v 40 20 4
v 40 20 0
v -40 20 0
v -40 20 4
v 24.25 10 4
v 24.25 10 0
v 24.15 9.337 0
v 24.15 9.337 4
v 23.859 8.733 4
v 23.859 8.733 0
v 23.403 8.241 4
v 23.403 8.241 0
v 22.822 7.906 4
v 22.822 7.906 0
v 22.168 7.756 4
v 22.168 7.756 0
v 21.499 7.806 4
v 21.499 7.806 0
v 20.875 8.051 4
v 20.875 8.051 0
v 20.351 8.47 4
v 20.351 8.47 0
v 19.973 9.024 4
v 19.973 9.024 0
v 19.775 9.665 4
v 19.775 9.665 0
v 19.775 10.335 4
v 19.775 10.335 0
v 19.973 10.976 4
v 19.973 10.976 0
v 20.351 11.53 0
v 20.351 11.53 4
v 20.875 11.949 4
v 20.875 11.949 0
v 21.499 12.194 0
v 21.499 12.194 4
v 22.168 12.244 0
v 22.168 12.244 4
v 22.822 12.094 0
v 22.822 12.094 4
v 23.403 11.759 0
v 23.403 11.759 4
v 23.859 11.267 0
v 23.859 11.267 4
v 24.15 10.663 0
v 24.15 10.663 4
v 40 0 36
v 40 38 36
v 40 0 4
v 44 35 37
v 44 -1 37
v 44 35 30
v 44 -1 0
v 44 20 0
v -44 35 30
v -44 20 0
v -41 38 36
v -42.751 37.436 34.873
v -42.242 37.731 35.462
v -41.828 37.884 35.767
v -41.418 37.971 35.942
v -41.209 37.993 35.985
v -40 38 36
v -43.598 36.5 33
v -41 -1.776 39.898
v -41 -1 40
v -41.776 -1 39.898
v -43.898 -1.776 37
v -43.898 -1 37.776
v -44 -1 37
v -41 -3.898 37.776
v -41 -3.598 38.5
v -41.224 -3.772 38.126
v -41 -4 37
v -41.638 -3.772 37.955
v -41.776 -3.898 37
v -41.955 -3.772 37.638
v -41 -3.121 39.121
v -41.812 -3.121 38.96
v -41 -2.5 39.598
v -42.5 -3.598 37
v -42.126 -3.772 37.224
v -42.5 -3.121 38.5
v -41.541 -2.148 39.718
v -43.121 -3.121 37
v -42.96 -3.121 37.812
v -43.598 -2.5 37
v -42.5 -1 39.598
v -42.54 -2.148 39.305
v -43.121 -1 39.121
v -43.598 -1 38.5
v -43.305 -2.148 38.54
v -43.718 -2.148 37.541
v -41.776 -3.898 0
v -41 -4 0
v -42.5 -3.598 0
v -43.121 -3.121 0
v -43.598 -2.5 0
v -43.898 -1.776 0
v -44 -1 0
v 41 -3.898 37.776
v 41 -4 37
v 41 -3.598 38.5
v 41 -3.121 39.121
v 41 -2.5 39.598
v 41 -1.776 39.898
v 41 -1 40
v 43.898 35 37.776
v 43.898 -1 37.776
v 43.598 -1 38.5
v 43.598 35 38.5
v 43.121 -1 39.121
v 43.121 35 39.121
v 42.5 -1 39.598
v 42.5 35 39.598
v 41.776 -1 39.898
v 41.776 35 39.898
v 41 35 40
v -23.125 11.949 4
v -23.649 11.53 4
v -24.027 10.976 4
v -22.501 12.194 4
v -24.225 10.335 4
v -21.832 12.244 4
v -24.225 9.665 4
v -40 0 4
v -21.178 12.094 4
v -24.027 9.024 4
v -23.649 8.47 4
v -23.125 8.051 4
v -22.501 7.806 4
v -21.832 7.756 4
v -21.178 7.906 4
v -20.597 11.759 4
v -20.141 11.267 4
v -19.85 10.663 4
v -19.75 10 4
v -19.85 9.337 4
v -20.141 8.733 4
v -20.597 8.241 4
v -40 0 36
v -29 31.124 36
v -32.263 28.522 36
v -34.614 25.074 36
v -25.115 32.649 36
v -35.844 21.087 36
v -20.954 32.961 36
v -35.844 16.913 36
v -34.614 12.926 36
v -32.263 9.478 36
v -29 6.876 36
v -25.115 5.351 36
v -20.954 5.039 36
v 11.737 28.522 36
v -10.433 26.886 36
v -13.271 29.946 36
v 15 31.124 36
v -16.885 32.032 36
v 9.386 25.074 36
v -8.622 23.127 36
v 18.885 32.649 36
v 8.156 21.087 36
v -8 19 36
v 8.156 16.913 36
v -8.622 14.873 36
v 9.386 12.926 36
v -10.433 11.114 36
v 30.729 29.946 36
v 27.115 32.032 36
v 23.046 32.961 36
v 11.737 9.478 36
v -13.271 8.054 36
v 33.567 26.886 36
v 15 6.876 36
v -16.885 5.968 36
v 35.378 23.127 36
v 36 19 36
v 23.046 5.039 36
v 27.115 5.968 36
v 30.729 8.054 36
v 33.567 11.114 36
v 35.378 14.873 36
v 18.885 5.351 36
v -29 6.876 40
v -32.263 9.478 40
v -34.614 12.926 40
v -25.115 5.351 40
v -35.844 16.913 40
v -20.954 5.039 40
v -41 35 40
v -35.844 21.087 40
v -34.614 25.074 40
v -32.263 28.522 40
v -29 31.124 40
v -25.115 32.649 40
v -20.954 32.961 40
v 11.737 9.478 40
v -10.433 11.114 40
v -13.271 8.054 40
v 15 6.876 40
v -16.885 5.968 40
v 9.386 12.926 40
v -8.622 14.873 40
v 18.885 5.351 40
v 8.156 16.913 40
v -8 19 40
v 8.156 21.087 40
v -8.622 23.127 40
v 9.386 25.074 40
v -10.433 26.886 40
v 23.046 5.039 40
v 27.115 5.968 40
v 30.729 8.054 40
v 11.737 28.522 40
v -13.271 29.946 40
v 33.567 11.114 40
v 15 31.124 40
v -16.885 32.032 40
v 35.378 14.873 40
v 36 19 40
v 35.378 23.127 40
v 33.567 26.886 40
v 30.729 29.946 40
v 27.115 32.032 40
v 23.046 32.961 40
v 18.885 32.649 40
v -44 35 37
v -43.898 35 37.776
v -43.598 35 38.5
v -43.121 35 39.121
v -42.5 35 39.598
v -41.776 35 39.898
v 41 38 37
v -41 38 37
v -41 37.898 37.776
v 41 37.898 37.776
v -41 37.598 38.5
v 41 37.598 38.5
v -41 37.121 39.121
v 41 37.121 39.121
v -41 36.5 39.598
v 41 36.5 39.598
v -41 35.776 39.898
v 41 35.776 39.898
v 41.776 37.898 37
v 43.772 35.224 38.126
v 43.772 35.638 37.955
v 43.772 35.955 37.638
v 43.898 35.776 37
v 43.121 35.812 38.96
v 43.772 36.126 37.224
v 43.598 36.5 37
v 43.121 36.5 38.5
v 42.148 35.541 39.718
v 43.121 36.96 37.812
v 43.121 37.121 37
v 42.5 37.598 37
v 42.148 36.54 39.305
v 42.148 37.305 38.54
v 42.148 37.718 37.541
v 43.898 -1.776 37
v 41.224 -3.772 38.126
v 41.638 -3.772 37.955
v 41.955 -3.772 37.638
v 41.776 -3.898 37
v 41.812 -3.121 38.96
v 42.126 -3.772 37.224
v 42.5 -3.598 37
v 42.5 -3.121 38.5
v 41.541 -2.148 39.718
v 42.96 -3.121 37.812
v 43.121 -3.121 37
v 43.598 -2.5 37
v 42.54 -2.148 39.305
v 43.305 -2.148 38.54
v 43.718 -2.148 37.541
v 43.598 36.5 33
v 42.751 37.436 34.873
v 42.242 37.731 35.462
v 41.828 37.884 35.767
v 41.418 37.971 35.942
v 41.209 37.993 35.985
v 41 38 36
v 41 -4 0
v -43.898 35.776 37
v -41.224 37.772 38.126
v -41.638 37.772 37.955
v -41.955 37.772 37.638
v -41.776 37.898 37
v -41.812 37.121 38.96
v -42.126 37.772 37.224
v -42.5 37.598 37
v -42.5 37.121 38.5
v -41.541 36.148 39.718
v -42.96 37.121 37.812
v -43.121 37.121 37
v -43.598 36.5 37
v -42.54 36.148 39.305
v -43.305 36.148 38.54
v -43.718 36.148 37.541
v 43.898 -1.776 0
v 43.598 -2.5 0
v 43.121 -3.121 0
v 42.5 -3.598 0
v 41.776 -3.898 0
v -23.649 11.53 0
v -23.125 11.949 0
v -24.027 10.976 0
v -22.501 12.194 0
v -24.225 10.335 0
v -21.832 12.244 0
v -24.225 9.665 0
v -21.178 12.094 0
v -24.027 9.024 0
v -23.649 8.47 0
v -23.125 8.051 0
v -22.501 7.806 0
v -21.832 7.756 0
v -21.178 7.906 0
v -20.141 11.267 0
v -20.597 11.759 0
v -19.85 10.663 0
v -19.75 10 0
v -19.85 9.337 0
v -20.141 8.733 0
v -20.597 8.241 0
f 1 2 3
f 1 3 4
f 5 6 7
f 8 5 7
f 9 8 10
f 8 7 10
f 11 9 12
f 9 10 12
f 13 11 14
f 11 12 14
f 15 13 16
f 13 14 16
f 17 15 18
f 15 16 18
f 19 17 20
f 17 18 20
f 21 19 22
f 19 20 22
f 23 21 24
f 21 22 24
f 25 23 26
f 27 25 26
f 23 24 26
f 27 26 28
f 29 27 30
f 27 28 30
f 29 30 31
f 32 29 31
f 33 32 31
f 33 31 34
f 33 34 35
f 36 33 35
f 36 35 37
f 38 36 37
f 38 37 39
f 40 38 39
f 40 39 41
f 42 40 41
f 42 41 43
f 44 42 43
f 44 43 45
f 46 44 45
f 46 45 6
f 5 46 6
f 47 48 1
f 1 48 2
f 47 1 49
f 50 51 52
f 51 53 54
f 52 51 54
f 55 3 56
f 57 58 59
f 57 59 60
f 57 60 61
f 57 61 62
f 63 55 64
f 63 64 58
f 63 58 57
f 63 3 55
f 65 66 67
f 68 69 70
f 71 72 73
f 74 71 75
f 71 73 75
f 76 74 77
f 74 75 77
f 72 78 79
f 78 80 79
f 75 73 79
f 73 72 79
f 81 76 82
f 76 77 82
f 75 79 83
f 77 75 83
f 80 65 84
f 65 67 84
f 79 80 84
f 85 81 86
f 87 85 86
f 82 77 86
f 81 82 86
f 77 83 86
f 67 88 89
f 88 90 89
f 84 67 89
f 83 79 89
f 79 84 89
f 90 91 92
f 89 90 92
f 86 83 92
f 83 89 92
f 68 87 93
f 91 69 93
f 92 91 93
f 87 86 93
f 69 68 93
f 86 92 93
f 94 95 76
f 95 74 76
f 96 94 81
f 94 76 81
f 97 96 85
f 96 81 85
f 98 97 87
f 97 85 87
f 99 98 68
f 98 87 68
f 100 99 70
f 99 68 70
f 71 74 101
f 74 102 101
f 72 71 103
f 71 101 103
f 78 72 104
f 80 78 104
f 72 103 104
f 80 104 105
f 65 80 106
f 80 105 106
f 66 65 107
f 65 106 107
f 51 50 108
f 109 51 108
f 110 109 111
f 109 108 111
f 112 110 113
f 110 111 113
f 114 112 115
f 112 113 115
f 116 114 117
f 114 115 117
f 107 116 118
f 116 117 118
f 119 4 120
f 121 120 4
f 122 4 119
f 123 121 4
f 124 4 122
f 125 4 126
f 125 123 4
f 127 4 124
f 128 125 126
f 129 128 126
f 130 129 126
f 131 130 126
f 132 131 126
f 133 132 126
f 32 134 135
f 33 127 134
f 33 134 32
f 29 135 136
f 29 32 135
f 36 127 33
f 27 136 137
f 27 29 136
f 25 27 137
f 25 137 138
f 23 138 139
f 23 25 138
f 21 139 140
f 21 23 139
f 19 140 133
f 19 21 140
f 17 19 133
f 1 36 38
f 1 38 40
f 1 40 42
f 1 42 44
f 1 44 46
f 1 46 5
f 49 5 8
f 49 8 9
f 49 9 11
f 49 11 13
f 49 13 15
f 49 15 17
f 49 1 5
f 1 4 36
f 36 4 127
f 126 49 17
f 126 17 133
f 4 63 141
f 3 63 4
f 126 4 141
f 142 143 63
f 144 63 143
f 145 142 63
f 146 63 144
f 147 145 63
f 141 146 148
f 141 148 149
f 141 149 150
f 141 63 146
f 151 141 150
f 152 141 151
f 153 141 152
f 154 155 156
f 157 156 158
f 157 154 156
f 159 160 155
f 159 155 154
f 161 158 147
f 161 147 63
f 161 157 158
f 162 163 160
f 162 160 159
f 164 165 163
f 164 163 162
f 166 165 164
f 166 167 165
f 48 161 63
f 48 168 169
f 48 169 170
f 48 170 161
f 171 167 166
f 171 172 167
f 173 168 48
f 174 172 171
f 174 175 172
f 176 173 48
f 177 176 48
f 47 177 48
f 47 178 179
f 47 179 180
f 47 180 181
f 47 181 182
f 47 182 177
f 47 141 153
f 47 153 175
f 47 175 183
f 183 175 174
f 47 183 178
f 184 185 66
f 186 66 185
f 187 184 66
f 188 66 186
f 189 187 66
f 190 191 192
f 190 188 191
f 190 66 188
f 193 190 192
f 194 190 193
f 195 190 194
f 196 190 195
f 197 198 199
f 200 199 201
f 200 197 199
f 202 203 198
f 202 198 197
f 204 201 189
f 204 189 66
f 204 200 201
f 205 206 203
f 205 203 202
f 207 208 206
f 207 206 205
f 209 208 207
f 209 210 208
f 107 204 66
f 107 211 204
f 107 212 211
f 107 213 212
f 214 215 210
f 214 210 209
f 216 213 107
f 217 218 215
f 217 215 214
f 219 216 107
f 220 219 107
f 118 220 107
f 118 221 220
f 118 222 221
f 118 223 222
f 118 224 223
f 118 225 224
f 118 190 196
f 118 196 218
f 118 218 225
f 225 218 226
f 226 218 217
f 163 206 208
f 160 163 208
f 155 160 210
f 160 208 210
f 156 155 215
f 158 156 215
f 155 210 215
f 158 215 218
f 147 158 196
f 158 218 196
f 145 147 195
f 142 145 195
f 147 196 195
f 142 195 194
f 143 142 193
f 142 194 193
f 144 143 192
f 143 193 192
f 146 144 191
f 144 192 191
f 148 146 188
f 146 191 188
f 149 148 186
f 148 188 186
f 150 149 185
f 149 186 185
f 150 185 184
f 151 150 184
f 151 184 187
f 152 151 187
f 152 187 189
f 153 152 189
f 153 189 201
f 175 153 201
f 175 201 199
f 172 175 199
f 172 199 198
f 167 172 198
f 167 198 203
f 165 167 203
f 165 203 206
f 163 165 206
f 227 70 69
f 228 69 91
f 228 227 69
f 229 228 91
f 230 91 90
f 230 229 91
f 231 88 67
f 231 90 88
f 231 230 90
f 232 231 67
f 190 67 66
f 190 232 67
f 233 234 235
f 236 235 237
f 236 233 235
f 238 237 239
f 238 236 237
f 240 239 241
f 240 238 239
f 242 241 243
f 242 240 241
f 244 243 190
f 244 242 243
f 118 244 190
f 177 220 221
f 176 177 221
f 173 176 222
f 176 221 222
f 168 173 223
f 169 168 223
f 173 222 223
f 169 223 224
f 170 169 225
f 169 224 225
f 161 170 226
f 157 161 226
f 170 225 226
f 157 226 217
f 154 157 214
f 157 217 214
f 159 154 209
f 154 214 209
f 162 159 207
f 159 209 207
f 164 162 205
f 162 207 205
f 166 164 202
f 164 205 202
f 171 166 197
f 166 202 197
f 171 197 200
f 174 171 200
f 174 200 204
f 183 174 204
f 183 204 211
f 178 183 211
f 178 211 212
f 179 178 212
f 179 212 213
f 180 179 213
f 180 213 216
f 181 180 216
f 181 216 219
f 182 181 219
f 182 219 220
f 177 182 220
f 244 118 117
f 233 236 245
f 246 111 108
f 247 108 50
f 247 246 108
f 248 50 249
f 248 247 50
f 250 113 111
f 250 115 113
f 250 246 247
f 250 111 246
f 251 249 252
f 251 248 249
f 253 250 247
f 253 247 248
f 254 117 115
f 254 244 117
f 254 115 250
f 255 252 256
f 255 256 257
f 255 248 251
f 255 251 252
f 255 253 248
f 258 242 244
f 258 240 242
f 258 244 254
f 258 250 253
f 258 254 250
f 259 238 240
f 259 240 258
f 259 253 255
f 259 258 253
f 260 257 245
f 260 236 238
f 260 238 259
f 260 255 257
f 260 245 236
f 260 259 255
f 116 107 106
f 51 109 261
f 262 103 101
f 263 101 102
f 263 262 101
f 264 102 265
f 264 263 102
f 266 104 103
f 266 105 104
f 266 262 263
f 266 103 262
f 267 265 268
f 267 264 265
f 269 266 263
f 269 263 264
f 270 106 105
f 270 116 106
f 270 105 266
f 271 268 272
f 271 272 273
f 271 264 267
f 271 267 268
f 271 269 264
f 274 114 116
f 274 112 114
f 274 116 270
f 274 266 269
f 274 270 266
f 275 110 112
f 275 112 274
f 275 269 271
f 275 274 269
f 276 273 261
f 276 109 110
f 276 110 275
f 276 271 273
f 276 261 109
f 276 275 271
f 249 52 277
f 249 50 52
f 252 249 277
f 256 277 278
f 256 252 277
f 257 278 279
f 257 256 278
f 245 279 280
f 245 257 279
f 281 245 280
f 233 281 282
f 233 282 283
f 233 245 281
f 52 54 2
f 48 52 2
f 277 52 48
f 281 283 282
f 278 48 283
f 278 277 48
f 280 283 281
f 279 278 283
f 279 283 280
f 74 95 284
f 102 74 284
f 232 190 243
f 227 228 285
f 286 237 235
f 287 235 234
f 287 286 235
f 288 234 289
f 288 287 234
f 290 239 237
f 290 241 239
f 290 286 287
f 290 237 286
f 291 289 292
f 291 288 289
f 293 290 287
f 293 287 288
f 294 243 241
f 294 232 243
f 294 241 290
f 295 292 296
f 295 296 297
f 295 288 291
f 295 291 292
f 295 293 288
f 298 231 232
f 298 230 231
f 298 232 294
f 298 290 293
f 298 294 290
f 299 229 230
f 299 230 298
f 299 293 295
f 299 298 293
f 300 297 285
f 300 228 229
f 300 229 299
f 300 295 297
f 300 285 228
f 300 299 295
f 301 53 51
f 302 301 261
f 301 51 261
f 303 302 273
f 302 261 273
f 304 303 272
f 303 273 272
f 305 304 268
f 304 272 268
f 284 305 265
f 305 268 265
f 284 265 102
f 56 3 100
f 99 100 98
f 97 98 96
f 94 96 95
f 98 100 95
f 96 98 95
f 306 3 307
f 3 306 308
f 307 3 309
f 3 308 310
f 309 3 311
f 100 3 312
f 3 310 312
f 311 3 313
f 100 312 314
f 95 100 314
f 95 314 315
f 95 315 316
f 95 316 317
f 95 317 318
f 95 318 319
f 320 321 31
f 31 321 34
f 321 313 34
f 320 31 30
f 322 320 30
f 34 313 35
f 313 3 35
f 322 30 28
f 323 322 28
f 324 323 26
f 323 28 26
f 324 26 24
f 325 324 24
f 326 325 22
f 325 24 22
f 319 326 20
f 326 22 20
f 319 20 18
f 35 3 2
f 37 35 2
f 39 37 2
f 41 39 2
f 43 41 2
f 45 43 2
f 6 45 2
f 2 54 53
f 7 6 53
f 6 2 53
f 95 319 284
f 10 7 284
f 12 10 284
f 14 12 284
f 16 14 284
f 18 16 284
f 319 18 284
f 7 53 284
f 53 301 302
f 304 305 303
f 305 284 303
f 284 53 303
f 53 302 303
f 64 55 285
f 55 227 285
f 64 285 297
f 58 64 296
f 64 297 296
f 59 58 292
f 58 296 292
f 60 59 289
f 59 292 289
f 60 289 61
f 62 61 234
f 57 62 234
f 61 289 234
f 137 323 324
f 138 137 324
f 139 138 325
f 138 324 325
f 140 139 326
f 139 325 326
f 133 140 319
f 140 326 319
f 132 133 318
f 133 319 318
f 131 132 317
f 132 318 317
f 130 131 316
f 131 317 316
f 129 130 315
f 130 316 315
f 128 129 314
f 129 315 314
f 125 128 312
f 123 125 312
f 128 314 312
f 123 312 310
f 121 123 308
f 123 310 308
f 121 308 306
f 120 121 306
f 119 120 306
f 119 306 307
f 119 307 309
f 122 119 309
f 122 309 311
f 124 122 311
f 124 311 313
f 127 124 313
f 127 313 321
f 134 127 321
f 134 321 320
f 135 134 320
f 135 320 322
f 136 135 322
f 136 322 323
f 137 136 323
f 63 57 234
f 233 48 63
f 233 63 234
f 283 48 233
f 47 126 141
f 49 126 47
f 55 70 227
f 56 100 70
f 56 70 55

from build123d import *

# Parameters (mm, degrees)
SKETCH_W        = 88
SKETCH_H        = 42
PAD_DEPTH       = 40
SKETCH001_W     = 80
SKETCH001_H     = 42.719318
POCKET_DEPTH    = 36
SKETCH002_R     = 14
POCKET001_DEPTH = 5
SKETCH003_W     = 20
SKETCH003_H     = 4
PAD001_DEPTH    = 80
SKETCH004_R     = 2.25
POCKET002_DEPTH = 5
POCKET003_DEPTH = 88.001
FILLET_R        = 3


with BuildPart() as part:
    # Sketch → Pad (new body)
    with BuildSketch(Plane.XY):
        with Locations((0, 17)):
            Rectangle(SKETCH_W, SKETCH_H)
    extrude(amount=PAD_DEPTH)

    # Sketch001 → Pocket (cut)
    with BuildSketch(Plane(origin=(0, 0, 0), x_dir=(1, 0, 0), z_dir=(0, 0, -1))):
        with Locations((0, -21.359659)):
            Rectangle(SKETCH001_W, SKETCH001_H)
    extrude(amount=-POCKET_DEPTH, mode=Mode.SUBTRACT)

    # Sketch002 → Pocket001 (cut)
    with BuildSketch(Plane.XY.offset(40)):
        with Locations((-22, 19)):
            Circle(SKETCH002_R)
        with Locations((22, 19)):
            Circle(SKETCH002_R)
    extrude(amount=-POCKET001_DEPTH, mode=Mode.SUBTRACT)

    # Sketch003 → Pad001 (new body)
    with BuildSketch(Plane(origin=(40, 0, 0), x_dir=(0, -1, 0), z_dir=(-1, 0, 0))):
        with Locations((-10, 2)):
            Rectangle(SKETCH003_W, SKETCH003_H)
    extrude(amount=PAD001_DEPTH)

    # Sketch004 → Pocket002 (cut)
    with BuildSketch(Plane(origin=(0, 0, 0), x_dir=(1, 0, 0), z_dir=(0, 0, -1))):
        with Locations((-22, -10)):
            Circle(SKETCH004_R)
        with Locations((22, -10)):
            Circle(SKETCH004_R)
    extrude(amount=-POCKET002_DEPTH, mode=Mode.SUBTRACT)

    # Sketch006 → Pocket003 (cut, through all)
    with BuildSketch(Plane.YZ.offset(44)):
        Polygon((20, 0), (38, 36), (38, 0), align=None)
    extrude(amount=-POCKET003_DEPTH, mode=Mode.SUBTRACT)

    # Fillet
    fillet_edges = [part.edges().sort_by_distance(p)[0] for p in [
        (-44, 17, 40),
        (0, 38, 40),
        (44, 17, 40),
        (0, -4, 40),
        (44, -4, 20),
        (-44, -4, 20),
        (44, 38, 38),
        (-44, 38, 38),
    ]]
    fillet(fillet_edges, radius=FILLET_R)


solid = part.part
